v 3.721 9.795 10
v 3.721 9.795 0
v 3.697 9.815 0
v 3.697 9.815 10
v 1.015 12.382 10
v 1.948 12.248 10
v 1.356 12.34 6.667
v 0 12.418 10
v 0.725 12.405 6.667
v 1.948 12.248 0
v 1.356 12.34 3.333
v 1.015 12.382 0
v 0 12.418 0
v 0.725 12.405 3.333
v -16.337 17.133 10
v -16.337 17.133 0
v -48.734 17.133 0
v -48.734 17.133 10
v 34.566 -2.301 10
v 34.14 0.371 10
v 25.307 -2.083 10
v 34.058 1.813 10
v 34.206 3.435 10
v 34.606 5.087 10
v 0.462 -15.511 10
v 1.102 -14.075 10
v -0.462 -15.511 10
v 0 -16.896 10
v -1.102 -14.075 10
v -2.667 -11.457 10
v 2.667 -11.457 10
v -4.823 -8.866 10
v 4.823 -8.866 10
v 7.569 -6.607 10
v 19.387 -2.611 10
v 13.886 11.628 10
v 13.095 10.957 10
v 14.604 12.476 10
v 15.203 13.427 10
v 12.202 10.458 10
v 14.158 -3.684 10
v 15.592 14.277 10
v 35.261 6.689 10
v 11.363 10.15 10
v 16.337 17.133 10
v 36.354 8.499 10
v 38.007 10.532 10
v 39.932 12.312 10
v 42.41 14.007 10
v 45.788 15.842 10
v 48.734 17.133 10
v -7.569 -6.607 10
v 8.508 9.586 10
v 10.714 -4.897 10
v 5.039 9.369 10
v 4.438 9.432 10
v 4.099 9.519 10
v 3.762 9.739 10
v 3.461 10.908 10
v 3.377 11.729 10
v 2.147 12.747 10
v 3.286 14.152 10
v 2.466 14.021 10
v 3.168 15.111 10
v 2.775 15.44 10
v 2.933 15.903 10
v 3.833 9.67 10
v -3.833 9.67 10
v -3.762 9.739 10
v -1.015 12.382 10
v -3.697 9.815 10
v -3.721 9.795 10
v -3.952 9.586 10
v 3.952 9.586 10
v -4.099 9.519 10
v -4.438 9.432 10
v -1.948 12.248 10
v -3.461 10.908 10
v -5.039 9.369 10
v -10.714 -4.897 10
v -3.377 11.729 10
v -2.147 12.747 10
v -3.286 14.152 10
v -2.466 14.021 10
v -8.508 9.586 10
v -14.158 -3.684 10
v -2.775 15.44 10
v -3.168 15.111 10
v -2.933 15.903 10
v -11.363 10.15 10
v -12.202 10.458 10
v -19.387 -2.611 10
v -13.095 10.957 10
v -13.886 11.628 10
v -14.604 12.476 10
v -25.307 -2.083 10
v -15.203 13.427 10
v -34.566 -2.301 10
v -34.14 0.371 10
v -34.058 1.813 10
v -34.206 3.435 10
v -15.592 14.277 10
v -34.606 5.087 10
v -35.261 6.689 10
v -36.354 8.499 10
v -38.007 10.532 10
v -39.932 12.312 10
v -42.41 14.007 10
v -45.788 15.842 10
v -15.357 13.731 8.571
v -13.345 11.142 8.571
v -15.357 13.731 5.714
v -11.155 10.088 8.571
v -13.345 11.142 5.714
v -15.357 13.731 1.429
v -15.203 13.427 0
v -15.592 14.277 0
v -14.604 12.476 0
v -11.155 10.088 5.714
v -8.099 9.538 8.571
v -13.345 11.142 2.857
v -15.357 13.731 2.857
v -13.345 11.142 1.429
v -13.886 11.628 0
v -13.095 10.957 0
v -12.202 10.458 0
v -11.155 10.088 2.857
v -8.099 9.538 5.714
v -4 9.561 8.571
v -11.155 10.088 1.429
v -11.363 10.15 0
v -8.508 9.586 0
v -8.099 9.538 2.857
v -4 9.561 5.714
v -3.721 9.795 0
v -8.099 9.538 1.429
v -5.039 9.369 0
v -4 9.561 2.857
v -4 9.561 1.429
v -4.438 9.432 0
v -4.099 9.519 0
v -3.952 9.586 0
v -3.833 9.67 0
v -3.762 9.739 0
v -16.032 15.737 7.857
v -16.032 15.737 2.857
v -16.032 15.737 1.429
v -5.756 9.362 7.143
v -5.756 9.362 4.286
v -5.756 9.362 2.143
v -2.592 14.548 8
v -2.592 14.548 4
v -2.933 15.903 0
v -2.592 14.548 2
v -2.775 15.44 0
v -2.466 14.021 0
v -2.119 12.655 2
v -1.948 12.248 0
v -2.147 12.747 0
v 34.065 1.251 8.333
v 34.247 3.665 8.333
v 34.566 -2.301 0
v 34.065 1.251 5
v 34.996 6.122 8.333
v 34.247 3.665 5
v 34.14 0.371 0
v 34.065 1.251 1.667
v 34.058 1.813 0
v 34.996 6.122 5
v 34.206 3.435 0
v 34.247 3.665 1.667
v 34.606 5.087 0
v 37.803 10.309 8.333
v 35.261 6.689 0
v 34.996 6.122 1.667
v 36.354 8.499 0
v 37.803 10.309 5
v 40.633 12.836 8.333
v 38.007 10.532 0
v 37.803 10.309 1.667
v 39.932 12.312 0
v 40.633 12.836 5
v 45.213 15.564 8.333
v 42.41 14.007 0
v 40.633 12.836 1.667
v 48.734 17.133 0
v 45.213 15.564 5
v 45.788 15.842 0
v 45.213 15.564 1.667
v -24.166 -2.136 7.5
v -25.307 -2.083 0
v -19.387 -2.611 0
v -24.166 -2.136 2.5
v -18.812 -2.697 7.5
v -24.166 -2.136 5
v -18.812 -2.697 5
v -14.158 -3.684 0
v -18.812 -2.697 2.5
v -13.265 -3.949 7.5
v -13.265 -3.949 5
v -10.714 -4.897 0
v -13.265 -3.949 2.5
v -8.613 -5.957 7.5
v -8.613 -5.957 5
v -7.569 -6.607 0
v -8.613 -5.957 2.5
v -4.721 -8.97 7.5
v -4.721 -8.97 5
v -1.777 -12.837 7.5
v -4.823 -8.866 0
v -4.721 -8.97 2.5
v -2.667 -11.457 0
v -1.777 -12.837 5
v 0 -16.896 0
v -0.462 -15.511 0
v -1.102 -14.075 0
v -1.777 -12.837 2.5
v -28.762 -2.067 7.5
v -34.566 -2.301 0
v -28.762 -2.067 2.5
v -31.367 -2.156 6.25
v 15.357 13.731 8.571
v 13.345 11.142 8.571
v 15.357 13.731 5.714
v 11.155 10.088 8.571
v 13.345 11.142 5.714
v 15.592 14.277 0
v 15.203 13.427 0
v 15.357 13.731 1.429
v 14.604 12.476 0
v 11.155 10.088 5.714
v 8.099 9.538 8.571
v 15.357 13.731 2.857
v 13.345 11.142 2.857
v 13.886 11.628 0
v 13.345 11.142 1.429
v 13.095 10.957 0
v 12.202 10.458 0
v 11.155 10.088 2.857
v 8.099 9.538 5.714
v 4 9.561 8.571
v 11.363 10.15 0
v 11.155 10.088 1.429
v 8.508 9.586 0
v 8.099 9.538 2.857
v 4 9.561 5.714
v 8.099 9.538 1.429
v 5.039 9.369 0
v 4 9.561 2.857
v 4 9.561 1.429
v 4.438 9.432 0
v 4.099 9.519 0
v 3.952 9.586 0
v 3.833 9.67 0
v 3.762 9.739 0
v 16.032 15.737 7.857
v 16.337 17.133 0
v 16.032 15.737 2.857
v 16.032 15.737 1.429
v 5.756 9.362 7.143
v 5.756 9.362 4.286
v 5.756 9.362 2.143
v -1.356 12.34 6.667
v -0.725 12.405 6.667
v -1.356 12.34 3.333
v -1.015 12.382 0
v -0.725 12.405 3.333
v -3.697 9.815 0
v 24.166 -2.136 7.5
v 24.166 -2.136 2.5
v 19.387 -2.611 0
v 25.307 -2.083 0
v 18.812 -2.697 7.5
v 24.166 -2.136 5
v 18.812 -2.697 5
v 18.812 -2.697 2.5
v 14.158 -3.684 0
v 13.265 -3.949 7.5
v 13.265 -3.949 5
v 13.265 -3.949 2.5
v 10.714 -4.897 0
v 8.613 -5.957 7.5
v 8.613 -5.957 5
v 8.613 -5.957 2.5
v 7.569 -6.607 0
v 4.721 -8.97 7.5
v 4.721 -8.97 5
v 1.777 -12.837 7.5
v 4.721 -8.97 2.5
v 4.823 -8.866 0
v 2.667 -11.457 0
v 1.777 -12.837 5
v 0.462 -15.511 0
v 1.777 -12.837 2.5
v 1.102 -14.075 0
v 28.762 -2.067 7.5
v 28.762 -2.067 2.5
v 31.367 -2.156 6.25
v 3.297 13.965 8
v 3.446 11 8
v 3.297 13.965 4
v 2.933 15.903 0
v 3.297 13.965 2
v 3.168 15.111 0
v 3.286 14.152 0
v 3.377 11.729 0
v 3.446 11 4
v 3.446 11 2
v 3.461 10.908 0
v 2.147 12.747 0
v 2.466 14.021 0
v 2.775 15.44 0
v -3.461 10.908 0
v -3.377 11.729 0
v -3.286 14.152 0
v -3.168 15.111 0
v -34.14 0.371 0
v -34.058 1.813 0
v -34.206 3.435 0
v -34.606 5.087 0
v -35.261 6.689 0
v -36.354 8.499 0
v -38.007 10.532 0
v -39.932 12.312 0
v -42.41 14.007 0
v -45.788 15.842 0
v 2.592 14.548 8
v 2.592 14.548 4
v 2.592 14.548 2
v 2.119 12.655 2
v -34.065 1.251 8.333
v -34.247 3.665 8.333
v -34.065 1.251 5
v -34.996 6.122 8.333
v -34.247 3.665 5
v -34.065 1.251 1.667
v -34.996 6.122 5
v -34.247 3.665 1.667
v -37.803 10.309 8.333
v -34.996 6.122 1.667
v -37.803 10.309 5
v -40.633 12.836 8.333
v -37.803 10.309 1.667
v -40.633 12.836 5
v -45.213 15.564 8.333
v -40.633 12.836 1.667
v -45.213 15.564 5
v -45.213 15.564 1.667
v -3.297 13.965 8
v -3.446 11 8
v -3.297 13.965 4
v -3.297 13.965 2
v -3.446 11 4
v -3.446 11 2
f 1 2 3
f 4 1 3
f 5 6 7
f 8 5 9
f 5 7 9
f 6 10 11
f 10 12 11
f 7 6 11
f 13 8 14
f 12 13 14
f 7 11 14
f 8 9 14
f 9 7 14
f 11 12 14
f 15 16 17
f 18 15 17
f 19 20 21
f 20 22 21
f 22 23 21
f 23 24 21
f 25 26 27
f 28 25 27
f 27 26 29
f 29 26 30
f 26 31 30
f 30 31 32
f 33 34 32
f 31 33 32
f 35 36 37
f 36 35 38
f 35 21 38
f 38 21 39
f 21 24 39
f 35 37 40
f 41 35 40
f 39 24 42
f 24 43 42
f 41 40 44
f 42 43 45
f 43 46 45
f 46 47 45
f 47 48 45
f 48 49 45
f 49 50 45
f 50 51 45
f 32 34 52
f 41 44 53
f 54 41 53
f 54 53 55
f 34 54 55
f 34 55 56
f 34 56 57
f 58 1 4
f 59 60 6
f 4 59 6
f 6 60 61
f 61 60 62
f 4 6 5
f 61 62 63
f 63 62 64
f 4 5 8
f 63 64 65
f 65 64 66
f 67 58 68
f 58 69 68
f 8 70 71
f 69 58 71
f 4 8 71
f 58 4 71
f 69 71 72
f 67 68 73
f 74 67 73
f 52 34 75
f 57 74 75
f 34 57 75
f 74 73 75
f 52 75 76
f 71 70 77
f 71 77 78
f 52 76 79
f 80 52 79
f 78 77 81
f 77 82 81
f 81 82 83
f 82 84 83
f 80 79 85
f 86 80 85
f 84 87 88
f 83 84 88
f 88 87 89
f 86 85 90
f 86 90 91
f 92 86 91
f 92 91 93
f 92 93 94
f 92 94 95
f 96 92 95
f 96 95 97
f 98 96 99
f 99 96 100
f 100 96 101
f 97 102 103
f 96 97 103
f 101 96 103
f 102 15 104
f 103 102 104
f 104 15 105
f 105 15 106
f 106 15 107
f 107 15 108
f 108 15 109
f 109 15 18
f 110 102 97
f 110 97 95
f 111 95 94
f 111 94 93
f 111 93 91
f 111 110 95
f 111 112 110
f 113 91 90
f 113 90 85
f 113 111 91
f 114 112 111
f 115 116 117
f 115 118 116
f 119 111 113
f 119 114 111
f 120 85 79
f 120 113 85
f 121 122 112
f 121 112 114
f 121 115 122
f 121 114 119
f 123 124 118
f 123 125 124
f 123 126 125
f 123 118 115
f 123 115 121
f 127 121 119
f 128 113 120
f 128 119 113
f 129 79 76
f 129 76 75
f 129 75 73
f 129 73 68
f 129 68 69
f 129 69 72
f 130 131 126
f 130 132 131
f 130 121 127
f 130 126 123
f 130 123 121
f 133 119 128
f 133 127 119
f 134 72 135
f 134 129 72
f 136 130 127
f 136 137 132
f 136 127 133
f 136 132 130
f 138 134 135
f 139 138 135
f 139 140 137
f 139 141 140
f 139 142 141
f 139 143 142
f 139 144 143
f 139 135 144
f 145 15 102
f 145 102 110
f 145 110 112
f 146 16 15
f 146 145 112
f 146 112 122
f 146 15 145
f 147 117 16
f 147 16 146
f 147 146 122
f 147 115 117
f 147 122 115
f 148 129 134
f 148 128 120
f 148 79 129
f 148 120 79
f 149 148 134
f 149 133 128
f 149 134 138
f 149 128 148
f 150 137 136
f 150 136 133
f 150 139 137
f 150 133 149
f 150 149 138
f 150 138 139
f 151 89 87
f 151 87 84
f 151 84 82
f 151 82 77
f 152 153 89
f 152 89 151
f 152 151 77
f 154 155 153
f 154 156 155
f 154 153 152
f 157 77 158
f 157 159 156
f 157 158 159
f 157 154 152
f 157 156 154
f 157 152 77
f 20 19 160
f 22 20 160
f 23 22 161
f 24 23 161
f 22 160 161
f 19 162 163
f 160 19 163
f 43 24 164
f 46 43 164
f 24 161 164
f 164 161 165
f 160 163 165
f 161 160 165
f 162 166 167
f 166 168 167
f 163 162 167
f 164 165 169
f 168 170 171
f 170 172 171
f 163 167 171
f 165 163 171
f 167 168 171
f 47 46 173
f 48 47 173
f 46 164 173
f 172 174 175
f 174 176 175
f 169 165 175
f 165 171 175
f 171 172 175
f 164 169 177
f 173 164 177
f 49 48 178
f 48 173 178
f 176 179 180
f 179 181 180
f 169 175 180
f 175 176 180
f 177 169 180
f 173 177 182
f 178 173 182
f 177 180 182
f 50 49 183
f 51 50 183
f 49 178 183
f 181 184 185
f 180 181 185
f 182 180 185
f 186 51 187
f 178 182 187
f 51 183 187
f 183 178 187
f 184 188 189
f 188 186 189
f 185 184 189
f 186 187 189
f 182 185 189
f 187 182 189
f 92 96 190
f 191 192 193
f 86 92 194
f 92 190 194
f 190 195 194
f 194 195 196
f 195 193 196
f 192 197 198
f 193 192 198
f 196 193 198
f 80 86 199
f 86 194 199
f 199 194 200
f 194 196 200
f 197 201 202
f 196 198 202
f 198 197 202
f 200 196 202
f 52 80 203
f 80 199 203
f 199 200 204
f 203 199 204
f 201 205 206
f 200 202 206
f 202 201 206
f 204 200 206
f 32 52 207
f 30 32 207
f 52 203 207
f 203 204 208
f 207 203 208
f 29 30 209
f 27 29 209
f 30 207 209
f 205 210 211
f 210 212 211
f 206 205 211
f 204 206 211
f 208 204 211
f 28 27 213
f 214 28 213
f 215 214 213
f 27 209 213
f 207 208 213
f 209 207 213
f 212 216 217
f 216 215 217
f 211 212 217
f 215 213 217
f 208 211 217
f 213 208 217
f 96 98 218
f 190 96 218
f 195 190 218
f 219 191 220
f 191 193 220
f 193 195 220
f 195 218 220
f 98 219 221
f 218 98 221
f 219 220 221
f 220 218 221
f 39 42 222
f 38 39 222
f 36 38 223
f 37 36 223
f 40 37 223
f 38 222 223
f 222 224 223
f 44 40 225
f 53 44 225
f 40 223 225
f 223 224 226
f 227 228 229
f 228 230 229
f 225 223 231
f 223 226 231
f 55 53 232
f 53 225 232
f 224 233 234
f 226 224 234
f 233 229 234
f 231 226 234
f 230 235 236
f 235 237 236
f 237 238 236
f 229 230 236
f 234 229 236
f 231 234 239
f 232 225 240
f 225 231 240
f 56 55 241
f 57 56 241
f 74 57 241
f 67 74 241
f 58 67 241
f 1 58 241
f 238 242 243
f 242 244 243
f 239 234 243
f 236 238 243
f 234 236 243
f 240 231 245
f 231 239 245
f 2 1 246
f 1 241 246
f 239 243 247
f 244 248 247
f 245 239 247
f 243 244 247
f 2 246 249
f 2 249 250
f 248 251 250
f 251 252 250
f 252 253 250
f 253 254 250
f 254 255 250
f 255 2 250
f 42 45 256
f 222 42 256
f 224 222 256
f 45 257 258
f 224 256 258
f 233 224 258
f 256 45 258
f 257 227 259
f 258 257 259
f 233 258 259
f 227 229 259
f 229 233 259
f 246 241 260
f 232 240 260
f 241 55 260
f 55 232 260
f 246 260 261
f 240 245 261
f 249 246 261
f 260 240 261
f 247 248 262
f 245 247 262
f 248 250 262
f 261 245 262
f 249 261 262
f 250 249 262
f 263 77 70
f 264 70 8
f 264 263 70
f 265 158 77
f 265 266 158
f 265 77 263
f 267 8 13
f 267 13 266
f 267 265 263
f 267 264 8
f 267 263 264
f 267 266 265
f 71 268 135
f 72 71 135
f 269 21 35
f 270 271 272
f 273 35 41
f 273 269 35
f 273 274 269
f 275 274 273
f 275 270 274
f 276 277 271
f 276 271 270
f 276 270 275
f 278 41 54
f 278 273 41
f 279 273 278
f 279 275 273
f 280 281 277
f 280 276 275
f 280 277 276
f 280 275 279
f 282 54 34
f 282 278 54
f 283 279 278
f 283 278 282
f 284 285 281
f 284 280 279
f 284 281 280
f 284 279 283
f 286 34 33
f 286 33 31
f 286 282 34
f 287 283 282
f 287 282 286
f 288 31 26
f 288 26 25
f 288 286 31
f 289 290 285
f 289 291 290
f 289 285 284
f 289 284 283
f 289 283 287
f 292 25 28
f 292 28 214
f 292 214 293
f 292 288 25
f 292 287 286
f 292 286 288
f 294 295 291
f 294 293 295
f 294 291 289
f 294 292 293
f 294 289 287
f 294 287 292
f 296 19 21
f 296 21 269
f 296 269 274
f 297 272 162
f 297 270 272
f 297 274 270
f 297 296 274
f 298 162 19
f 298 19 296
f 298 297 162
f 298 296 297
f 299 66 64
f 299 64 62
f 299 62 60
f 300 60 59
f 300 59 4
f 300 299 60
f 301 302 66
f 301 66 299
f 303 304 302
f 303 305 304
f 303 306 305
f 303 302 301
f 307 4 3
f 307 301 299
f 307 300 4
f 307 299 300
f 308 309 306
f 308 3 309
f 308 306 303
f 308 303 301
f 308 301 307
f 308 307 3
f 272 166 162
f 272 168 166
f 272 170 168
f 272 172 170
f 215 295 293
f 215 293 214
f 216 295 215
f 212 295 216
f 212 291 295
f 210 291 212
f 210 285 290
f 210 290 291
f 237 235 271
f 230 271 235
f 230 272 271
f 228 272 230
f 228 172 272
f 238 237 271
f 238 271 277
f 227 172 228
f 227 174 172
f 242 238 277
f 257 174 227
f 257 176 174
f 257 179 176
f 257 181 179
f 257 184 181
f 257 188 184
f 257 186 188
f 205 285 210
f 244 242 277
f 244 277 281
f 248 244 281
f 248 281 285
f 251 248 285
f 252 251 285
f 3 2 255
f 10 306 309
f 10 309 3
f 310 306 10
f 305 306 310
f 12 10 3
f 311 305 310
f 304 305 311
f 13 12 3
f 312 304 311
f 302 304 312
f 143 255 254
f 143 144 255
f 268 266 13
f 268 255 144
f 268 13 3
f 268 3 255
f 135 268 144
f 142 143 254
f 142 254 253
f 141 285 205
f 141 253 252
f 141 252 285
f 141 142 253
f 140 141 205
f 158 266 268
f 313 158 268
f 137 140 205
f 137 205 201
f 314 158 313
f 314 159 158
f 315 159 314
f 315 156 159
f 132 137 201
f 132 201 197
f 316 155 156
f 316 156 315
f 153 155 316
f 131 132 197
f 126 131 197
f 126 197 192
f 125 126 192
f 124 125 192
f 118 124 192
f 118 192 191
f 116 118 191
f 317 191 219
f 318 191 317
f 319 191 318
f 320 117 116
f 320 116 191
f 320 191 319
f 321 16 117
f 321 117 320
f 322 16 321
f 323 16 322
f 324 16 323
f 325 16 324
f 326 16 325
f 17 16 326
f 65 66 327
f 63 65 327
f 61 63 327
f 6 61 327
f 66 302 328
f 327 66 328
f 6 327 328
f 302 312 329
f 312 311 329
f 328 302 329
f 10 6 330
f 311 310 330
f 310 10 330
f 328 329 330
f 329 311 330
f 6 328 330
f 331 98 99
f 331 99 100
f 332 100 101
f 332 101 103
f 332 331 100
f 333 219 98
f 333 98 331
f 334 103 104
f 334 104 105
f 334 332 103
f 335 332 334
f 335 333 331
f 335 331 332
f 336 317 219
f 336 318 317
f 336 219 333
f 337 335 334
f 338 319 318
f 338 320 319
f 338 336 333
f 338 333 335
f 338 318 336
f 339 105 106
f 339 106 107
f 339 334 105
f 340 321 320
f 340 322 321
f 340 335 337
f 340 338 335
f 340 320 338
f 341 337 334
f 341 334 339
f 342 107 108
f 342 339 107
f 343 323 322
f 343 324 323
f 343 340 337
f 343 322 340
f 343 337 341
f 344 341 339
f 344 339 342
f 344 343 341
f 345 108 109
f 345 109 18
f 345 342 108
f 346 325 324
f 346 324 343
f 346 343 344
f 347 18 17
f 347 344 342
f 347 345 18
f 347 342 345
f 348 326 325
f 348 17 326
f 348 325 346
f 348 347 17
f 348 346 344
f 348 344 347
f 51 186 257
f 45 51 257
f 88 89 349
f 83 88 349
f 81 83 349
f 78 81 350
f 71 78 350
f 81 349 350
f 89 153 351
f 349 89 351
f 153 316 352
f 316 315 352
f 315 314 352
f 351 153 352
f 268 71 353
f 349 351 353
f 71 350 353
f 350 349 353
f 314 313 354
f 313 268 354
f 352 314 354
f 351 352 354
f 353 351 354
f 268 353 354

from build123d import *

# Parameters (mm, degrees)
F1_DEPTH = 10


with BuildPart() as f1:
    # F0 (on Top) → F1 (new body)
    with BuildSketch(Plane.XY):
        with BuildLine():
            add(Edge.make_bspline(
                [(-34.5659777522, -2.3010377772), (-34.441690892, -1.2090269011), (-33.7426143908, 1.3021229087), (-34.6099625003, 6.2887083902), (-37.732299485, 10.4337765544), (-40.4965689238, 12.9182984992), (-45.1676660532, 15.6816198367), (-47.6433440327, 16.6521064837), (-48.734344542, 17.1325933188)],
                knots=[0, 0, 0, 0, 0.1504717907, 0.3274056637, 0.505806187, 0.6605615473, 0.844008032, 1, 1, 1, 1], degree=3))
            add(Edge.make_bspline(
                [(-34.5659777522, -2.3010377772), (-29.7742336988, -2.0793164149), (-24.8478324902, -1.8245382393), (-12.9343956026, -3.3284422394), (-4.2994288291, -8.106275212), (-0.6981744502, -14.3344540986), (0, -16.8964266777)],
                knots=[0, 0, 0, 0, 0.2532524451, 0.514284306, 0.7614910609, 1, 1, 1, 1], degree=3))
            add(Edge.make_bspline(
                [(34.5659777522, -2.3010377772), (29.7742336988, -2.0793164149), (24.8478324902, -1.8245382393), (12.9343956026, -3.3284422394), (4.2994288291, -8.106275212), (0.6981744502, -14.3344540986), (0, -16.8964266777)],
                knots=[0, 0, 0, 0, 0.2532524451, 0.514284306, 0.7614910609, 1, 1, 1, 1], degree=3))
            add(Edge.make_bspline(
                [(34.5659777522, -2.3010377772), (34.441690892, -1.2090269011), (33.7426143908, 1.3021229087), (34.6099625003, 6.2887083902), (37.732299485, 10.4337765544), (40.4965689238, 12.9182984992), (45.1676660532, 15.6816198367), (47.6433440327, 16.6521064837), (48.734344542, 17.1325933188)],
                knots=[0, 0, 0, 0, 0.1504717907, 0.3274056637, 0.505806187, 0.6605615473, 0.844008032, 1, 1, 1, 1], degree=3))
            Line((48.734344542, 17.1325933188), (16.3374114782, 17.1325933188))
            add(Edge.make_bspline(
                [(16.3374114782, 17.1325933188), (16.2707590578, 16.8013167715), (16.1028193617, 16.0159047713), (15.5293351039, 13.5894216644), (13.5075885145, 10.9357028955), (11.0943832685, 9.979418199), (8.3278162532, 9.4999515323), (4.2337515187, 9.1916813282), (3.7513867907, 9.7417653506), (3.721309654, 9.7951889602)],
                knots=[0, 0, 0, 0, 0.1002529863, 0.2510752424, 0.4252888894, 0.575274046, 0.7448218724, 0.9396020225, 0.9846016995, 0.9846016995, 0.9846016995, 0.9846016995], degree=3))
            Line((3.721309654, 9.7951889602), (3.6973344953, 9.8154297664))
            add(Edge.make_bspline(
                [(2.932772506, 15.9026999027), (3.018619719, 15.6514358008), (3.2073644933, 15.0990033508), (3.3168408961, 13.9617858734), (3.3565401619, 12.068204215), (3.4100837285, 11.0186767215), (3.599767527, 10.2241220004), (3.6973344953, 9.8154297664)],
                knots=[0, 0, 0, 0, 0.16399089, 0.3605524565, 0.6106599974, 0.7997365931, 1, 1, 1, 1], degree=3))
            add(Edge.make_bspline(
                [(2.932772506, 15.9026999027), (2.8831992541, 15.7815790305), (2.7595296769, 15.4794207803), (2.6079557623, 14.5179694226), (2.311756701, 13.4620564486), (2.1469901884, 12.6659080553), (2.0074066607, 12.3726247092), (1.9479012117, 12.2475959361)],
                knots=[0, 0, 0, 0, 0.1539432383, 0.3840396681, 0.6350969803, 0.8444392514, 1, 1, 1, 1], degree=3))
            add(Edge.make_bspline(
                [(1.9479012117, 12.2475959361), (1.7516233528, 12.2796352379), (1.3532942381, 12.3446562585), (0.7217223004, 12.418893829), (0.2458943028, 12.4186232246), (0, 12.418483384)],
                knots=[0, 0, 0, 0, 0.3194597762, 0.6483162725, 1, 1, 1, 1], degree=3))
            add(Edge.make_bspline(
                [(-1.9479012117, 12.2475959361), (-1.7516233528, 12.2796352379), (-1.3532942381, 12.3446562585), (-0.7217223004, 12.418893829), (-0.2458943028, 12.4186232246), (0, 12.418483384)],
                knots=[0, 0, 0, 0, 0.3194597762, 0.6483162725, 1, 1, 1, 1], degree=3))
            add(Edge.make_bspline(
                [(-2.932772506, 15.9026999027), (-2.8831992541, 15.7815790305), (-2.7595296769, 15.4794207803), (-2.6079557623, 14.5179694226), (-2.311756701, 13.4620564486), (-2.1469901884, 12.6659080553), (-2.0074066607, 12.3726247092), (-1.9479012117, 12.2475959361)],
                knots=[0, 0, 0, 0, 0.1539432383, 0.3840396681, 0.6350969803, 0.8444392514, 1, 1, 1, 1], degree=3))
            add(Edge.make_bspline(
                [(-2.932772506, 15.9026999027), (-3.018619719, 15.6514358008), (-3.2073644933, 15.0990033508), (-3.3168408961, 13.9617858734), (-3.3565401619, 12.068204215), (-3.4100837285, 11.0186767215), (-3.599767527, 10.2241220004), (-3.6973344953, 9.8154297664)],
                knots=[0, 0, 0, 0, 0.16399089, 0.3605524565, 0.6106599974, 0.7997365931, 1, 1, 1, 1], degree=3))
            Line((-3.6973344953, 9.8154297664), (-3.721309654, 9.7951889602))
            add(Edge.make_bspline(
                [(-16.3374114782, 17.1325933188), (-16.2707590578, 16.8013167715), (-16.1028193617, 16.0159047713), (-15.5293351039, 13.5894216644), (-13.5075885145, 10.9357028955), (-11.0943832685, 9.979418199), (-8.3278162532, 9.4999515323), (-4.2337515187, 9.1916813282), (-3.7513867907, 9.7417653506), (-3.721309654, 9.7951889602)],
                knots=[0, 0, 0, 0, 0.1002529863, 0.2510752424, 0.4252888894, 0.575274046, 0.7448218724, 0.9396020225, 0.9846016995, 0.9846016995, 0.9846016995, 0.9846016995], degree=3))
            Line((-16.3374114782, 17.1325933188), (-48.734344542, 17.1325933188))
        make_face()
    extrude(amount=F1_DEPTH)


solid = f1.part
